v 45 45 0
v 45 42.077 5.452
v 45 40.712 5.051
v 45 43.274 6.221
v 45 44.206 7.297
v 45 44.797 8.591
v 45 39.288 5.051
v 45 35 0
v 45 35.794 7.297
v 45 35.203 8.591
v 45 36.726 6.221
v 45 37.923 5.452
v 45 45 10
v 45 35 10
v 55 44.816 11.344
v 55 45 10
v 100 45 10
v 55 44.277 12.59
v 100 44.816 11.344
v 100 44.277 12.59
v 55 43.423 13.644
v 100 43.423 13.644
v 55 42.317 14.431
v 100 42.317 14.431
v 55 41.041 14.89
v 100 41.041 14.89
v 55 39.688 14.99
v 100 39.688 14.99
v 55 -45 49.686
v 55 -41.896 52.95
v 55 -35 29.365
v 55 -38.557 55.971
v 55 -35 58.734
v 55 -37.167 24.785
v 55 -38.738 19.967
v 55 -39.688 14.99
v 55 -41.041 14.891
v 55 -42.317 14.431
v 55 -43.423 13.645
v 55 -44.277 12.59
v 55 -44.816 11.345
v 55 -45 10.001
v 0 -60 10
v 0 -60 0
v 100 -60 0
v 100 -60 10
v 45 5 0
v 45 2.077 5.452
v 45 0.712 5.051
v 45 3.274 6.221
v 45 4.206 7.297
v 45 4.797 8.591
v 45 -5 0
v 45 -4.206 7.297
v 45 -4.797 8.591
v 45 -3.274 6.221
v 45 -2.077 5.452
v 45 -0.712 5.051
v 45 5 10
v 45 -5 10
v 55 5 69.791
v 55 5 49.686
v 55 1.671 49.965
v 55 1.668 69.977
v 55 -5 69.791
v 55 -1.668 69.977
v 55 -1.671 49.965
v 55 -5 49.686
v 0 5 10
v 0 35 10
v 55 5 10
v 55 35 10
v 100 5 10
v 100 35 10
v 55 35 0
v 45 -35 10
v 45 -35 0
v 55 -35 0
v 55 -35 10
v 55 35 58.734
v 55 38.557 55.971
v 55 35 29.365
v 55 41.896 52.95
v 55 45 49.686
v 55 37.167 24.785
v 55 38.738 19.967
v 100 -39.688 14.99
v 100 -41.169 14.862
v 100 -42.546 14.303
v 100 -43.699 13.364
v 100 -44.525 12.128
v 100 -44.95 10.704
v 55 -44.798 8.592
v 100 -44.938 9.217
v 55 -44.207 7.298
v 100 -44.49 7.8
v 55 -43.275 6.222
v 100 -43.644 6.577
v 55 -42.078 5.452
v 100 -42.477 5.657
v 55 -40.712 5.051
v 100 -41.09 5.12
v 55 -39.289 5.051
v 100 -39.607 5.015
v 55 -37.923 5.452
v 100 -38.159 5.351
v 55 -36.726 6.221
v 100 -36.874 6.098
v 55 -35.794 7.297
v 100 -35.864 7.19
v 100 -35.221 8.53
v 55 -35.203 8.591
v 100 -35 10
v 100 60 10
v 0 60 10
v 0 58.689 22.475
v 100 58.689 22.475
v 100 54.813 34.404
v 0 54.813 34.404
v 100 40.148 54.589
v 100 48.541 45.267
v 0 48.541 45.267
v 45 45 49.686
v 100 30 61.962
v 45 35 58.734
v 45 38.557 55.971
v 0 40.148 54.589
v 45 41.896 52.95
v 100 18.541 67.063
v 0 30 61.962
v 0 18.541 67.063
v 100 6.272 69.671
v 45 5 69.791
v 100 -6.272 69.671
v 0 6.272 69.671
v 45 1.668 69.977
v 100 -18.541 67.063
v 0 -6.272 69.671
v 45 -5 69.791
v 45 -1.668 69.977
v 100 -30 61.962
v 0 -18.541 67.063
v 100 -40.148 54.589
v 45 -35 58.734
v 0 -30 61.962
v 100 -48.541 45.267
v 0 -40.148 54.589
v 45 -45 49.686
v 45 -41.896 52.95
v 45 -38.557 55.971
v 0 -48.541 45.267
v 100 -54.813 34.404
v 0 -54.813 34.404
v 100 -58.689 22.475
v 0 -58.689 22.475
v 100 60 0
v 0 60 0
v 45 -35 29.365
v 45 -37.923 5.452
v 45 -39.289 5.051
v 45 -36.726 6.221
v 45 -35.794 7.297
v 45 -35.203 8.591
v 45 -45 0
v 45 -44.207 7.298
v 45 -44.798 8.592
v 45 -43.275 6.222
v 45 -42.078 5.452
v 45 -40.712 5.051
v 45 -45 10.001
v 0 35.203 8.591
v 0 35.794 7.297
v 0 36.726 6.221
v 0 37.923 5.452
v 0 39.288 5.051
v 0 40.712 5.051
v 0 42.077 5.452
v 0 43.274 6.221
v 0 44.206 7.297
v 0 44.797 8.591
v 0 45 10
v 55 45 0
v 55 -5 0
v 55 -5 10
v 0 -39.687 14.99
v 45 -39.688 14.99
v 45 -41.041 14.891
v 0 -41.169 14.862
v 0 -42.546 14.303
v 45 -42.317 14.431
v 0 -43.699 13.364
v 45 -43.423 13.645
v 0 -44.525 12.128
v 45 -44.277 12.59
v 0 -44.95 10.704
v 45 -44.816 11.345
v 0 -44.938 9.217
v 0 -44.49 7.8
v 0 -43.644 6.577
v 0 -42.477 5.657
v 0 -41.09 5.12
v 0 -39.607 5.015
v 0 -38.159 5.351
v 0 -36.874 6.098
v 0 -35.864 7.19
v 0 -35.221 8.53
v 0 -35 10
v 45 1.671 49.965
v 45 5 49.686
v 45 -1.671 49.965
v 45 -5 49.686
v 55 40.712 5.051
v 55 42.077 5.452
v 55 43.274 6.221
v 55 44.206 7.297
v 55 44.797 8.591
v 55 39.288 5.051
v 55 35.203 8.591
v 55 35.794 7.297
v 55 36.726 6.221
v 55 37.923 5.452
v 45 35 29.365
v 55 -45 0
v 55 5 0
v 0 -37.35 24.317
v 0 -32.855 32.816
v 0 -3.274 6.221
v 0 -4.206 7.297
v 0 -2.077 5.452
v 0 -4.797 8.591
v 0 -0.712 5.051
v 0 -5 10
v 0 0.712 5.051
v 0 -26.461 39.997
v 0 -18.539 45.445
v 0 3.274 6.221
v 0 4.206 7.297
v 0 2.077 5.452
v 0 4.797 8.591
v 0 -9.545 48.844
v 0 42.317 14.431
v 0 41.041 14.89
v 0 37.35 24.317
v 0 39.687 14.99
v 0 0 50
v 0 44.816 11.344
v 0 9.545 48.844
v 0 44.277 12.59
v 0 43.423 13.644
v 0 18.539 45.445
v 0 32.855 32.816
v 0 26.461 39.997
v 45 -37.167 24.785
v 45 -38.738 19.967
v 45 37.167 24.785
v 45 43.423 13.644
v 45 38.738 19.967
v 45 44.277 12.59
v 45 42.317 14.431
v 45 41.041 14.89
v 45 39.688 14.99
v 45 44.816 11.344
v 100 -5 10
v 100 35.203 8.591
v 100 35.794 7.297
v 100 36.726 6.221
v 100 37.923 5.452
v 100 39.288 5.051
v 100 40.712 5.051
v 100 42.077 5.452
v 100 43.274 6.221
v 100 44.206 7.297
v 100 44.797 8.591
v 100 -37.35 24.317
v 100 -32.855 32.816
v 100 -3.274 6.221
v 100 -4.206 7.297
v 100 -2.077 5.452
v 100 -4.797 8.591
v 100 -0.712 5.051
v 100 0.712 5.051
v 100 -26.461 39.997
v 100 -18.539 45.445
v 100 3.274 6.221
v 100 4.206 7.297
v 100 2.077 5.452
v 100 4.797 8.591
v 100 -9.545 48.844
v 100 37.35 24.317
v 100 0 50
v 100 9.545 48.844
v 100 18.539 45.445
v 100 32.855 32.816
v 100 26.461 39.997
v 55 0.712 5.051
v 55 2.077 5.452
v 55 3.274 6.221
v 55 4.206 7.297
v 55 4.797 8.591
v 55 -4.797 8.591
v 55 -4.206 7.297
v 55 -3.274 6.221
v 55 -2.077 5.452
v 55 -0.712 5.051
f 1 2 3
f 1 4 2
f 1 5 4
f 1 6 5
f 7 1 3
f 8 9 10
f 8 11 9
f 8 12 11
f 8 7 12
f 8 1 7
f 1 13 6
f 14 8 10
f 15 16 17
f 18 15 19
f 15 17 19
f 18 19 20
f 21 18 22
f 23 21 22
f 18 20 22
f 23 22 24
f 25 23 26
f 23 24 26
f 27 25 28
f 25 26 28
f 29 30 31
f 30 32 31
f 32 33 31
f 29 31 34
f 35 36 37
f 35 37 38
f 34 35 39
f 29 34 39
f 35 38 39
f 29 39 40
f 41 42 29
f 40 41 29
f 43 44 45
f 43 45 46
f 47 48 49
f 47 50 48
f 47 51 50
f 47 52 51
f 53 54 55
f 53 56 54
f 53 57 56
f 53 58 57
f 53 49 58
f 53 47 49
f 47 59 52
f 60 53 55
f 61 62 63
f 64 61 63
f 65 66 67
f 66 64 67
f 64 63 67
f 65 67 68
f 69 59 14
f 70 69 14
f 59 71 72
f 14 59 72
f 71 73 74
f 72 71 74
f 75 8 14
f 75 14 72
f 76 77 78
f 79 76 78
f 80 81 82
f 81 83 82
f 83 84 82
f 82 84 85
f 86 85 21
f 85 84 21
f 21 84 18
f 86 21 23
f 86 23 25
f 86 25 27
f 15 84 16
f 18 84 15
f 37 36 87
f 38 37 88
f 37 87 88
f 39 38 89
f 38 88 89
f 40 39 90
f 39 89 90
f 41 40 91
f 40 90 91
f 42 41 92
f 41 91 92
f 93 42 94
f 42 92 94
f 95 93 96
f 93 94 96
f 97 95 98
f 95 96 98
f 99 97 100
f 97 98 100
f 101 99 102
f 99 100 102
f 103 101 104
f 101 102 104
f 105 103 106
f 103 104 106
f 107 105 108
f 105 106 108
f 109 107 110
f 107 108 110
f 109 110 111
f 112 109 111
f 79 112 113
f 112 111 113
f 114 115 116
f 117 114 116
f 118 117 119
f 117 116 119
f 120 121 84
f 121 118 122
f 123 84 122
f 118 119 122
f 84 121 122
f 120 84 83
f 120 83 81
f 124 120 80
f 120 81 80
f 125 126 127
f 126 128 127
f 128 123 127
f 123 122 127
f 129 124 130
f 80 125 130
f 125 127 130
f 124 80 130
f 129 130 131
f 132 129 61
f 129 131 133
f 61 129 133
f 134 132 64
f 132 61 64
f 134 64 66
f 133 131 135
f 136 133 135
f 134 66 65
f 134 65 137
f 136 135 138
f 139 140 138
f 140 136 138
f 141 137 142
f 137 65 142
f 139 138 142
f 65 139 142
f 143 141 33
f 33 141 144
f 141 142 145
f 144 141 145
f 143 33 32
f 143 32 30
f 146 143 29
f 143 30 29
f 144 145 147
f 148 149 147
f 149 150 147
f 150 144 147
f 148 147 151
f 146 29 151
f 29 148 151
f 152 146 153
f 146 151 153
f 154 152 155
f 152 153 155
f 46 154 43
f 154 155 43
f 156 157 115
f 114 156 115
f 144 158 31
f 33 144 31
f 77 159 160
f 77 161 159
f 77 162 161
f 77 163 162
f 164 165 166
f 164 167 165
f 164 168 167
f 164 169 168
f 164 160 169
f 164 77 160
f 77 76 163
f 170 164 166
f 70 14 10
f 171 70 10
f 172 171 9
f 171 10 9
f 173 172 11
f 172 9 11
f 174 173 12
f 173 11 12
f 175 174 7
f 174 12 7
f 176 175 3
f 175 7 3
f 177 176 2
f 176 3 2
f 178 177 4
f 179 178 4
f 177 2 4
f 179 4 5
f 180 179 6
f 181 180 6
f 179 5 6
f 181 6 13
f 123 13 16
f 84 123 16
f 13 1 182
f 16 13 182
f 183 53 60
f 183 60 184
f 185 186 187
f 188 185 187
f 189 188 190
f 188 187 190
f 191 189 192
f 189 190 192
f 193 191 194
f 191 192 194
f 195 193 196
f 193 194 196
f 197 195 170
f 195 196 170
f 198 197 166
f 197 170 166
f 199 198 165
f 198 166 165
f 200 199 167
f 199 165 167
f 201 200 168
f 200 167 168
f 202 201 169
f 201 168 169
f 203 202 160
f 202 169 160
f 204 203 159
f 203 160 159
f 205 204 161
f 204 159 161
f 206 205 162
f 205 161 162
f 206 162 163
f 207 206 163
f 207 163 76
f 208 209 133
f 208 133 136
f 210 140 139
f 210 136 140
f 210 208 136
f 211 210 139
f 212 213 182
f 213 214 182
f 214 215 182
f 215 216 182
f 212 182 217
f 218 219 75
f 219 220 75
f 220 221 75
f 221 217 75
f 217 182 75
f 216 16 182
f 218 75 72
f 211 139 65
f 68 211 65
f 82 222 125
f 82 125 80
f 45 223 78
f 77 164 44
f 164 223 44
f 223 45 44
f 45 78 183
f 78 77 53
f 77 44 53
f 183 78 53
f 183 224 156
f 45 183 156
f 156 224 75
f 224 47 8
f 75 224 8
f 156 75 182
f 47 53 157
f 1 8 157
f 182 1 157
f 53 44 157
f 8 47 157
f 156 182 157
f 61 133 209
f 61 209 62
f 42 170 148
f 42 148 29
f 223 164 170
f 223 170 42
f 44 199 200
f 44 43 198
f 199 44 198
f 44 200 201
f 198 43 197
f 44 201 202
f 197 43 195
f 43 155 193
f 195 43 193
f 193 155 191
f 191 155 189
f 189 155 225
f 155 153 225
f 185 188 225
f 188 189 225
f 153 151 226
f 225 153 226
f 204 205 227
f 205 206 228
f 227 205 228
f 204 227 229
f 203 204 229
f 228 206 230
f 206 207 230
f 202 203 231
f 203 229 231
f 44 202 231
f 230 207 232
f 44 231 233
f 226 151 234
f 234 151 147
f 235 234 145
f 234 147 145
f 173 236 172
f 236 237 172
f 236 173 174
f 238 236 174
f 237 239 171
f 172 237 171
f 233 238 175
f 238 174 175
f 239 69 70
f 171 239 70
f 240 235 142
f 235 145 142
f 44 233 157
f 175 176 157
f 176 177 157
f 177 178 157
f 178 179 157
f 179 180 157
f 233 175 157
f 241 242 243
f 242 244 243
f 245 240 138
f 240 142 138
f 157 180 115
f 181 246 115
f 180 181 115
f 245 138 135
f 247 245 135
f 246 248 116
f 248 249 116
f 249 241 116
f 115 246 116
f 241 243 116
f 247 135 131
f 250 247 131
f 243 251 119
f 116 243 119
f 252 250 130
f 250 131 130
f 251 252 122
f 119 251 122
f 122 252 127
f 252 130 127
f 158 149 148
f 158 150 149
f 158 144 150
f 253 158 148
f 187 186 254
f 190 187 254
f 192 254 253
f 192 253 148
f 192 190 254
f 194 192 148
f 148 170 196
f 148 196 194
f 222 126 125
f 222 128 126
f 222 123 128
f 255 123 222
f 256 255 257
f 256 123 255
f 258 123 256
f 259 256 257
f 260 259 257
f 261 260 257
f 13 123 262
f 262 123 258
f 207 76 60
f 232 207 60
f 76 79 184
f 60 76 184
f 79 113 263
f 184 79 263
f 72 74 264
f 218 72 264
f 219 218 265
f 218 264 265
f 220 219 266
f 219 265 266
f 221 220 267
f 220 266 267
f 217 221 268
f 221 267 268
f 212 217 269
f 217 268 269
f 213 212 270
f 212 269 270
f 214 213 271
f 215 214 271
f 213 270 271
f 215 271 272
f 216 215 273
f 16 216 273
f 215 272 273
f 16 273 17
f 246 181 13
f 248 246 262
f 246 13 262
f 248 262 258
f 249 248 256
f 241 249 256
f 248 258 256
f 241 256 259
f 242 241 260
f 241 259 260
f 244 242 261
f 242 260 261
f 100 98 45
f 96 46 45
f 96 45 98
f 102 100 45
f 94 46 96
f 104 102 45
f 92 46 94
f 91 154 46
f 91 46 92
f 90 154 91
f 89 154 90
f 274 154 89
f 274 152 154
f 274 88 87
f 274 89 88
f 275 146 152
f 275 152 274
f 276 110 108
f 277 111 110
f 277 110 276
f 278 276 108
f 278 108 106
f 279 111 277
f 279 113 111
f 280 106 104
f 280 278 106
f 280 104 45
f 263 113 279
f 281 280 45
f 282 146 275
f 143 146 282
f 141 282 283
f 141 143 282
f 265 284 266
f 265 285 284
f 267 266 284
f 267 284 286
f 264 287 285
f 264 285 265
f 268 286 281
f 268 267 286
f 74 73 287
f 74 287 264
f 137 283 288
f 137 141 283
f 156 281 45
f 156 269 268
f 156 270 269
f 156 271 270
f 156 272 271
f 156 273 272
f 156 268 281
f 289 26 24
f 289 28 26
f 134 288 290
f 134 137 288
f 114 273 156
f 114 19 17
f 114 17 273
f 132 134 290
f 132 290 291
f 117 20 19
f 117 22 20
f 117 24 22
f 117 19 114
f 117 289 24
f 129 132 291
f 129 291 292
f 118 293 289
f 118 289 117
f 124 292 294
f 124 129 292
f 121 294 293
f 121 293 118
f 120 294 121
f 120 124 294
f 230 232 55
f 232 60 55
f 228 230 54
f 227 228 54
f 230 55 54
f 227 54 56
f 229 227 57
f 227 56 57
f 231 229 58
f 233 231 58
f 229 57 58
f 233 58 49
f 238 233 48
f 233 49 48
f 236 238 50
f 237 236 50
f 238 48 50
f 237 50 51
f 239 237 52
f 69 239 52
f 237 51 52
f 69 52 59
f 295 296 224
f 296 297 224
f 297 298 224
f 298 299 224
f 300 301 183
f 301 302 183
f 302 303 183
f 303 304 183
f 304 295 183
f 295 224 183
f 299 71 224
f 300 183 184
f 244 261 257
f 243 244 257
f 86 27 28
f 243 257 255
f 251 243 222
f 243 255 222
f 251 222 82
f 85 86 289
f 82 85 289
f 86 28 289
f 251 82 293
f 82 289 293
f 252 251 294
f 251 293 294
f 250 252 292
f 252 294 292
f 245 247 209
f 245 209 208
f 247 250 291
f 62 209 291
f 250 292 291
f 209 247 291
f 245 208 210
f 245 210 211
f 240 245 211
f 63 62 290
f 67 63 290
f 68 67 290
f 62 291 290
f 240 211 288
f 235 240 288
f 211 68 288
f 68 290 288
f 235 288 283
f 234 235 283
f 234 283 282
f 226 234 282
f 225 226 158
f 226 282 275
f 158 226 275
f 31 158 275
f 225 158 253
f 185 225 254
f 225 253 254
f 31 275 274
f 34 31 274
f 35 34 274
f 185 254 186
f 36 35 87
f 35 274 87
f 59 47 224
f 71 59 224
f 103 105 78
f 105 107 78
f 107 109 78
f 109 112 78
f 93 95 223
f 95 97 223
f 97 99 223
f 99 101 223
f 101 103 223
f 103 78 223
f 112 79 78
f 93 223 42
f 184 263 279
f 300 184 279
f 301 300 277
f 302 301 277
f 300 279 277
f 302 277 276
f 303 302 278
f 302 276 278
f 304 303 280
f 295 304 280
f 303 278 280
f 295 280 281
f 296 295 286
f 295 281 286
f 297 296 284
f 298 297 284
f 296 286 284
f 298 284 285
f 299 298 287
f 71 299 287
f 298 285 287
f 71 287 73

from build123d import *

# Parameters (mm, degrees)
F0_W     = 120
F0_H     = 10
F1_DEPTH = 100
F3_DEPTH = 100.001
F5_DEPTH = 100.001
F6_W     = 10
F6_H     = 10
F7_DEPTH = 70.001


with BuildPart() as f1:
    # F0 (on Right) → F1 (new body)
    with BuildSketch(Plane.YZ):
        with Locations((0, 5)):
            Rectangle(F0_W, F0_H)
        with BuildLine():
            Line((-60, 10), (60, 10))
            ThreePointArc((60, 10), (0, 70), (-60, 10))
        make_face()
    extrude(amount=F1_DEPTH)

    # F2 (on face) → F3 (cut, through all)
    with BuildSketch(Plane.YZ.offset(100)):
        with BuildLine():
            ThreePointArc((40, 10), (0, 50), (-40, 10))
            Line((-40, 10), (40, 10))
        make_face()
    extrude(amount=-F3_DEPTH, mode=Mode.SUBTRACT)

    # F4 (on face) → F5 (cut, through all)
    with BuildSketch(Plane.YZ.offset(100)):
        with BuildLine():
            ThreePointArc((-5, 10), (0, 5), (5, 10))
            Line((5, 10), (-5, 10))
        make_face()
        with BuildLine():
            Line((-5, 10), (5, 10))
            ThreePointArc((5, 10), (0, 15), (-5, 10))
        make_face()
        with BuildLine():
            ThreePointArc((39.6875, 14.990225), (36.355655, 13.423266), (35, 10))
            Line((35, 10), (40, 10))
            ThreePointArc((40, 10), (39.921799, 12.5), (39.6875, 14.990225))
        make_face()
        with BuildLine():
            Line((-40, 10), (-35, 10))
            ThreePointArc((-35, 10), (-36.355655, 13.423266), (-39.6875, 14.990225))
            ThreePointArc((-39.6875, 14.990225), (-39.921799, 12.5), (-40, 10))
        make_face()
        with BuildLine():
            ThreePointArc((-39.6875, 14.990225), (-43.644345, 6.576734), (-35, 10))
            Line((-35, 10), (-40, 10))
            ThreePointArc((-40, 10), (-39.921799, 12.5), (-39.6875, 14.990225))
        make_face()
        with BuildLine():
            Line((40, 10), (35, 10))
            ThreePointArc((35, 10), (40, 5), (45, 10))
            ThreePointArc((45, 10), (43.423266, 13.644345), (39.6875, 14.990225))
            ThreePointArc((39.6875, 14.990225), (39.921799, 12.5), (40, 10))
        make_face()
    extrude(amount=-F5_DEPTH, mode=Mode.SUBTRACT)

    # F6 (on face) → F7 (cut, through all)
    with BuildSketch(Plane(origin=(0, 0, 0), x_dir=(1, 0, 0), z_dir=(0, 0, -1))):
        with Locations((50, 40)):
            Rectangle(F6_W, F6_H)
        with Locations((50, 0)):
            Rectangle(F6_W, F6_H)
        with Locations((50, -40)):
            Rectangle(F6_W, F6_H)
    extrude(amount=-F7_DEPTH, mode=Mode.SUBTRACT)


solid = f1.part
